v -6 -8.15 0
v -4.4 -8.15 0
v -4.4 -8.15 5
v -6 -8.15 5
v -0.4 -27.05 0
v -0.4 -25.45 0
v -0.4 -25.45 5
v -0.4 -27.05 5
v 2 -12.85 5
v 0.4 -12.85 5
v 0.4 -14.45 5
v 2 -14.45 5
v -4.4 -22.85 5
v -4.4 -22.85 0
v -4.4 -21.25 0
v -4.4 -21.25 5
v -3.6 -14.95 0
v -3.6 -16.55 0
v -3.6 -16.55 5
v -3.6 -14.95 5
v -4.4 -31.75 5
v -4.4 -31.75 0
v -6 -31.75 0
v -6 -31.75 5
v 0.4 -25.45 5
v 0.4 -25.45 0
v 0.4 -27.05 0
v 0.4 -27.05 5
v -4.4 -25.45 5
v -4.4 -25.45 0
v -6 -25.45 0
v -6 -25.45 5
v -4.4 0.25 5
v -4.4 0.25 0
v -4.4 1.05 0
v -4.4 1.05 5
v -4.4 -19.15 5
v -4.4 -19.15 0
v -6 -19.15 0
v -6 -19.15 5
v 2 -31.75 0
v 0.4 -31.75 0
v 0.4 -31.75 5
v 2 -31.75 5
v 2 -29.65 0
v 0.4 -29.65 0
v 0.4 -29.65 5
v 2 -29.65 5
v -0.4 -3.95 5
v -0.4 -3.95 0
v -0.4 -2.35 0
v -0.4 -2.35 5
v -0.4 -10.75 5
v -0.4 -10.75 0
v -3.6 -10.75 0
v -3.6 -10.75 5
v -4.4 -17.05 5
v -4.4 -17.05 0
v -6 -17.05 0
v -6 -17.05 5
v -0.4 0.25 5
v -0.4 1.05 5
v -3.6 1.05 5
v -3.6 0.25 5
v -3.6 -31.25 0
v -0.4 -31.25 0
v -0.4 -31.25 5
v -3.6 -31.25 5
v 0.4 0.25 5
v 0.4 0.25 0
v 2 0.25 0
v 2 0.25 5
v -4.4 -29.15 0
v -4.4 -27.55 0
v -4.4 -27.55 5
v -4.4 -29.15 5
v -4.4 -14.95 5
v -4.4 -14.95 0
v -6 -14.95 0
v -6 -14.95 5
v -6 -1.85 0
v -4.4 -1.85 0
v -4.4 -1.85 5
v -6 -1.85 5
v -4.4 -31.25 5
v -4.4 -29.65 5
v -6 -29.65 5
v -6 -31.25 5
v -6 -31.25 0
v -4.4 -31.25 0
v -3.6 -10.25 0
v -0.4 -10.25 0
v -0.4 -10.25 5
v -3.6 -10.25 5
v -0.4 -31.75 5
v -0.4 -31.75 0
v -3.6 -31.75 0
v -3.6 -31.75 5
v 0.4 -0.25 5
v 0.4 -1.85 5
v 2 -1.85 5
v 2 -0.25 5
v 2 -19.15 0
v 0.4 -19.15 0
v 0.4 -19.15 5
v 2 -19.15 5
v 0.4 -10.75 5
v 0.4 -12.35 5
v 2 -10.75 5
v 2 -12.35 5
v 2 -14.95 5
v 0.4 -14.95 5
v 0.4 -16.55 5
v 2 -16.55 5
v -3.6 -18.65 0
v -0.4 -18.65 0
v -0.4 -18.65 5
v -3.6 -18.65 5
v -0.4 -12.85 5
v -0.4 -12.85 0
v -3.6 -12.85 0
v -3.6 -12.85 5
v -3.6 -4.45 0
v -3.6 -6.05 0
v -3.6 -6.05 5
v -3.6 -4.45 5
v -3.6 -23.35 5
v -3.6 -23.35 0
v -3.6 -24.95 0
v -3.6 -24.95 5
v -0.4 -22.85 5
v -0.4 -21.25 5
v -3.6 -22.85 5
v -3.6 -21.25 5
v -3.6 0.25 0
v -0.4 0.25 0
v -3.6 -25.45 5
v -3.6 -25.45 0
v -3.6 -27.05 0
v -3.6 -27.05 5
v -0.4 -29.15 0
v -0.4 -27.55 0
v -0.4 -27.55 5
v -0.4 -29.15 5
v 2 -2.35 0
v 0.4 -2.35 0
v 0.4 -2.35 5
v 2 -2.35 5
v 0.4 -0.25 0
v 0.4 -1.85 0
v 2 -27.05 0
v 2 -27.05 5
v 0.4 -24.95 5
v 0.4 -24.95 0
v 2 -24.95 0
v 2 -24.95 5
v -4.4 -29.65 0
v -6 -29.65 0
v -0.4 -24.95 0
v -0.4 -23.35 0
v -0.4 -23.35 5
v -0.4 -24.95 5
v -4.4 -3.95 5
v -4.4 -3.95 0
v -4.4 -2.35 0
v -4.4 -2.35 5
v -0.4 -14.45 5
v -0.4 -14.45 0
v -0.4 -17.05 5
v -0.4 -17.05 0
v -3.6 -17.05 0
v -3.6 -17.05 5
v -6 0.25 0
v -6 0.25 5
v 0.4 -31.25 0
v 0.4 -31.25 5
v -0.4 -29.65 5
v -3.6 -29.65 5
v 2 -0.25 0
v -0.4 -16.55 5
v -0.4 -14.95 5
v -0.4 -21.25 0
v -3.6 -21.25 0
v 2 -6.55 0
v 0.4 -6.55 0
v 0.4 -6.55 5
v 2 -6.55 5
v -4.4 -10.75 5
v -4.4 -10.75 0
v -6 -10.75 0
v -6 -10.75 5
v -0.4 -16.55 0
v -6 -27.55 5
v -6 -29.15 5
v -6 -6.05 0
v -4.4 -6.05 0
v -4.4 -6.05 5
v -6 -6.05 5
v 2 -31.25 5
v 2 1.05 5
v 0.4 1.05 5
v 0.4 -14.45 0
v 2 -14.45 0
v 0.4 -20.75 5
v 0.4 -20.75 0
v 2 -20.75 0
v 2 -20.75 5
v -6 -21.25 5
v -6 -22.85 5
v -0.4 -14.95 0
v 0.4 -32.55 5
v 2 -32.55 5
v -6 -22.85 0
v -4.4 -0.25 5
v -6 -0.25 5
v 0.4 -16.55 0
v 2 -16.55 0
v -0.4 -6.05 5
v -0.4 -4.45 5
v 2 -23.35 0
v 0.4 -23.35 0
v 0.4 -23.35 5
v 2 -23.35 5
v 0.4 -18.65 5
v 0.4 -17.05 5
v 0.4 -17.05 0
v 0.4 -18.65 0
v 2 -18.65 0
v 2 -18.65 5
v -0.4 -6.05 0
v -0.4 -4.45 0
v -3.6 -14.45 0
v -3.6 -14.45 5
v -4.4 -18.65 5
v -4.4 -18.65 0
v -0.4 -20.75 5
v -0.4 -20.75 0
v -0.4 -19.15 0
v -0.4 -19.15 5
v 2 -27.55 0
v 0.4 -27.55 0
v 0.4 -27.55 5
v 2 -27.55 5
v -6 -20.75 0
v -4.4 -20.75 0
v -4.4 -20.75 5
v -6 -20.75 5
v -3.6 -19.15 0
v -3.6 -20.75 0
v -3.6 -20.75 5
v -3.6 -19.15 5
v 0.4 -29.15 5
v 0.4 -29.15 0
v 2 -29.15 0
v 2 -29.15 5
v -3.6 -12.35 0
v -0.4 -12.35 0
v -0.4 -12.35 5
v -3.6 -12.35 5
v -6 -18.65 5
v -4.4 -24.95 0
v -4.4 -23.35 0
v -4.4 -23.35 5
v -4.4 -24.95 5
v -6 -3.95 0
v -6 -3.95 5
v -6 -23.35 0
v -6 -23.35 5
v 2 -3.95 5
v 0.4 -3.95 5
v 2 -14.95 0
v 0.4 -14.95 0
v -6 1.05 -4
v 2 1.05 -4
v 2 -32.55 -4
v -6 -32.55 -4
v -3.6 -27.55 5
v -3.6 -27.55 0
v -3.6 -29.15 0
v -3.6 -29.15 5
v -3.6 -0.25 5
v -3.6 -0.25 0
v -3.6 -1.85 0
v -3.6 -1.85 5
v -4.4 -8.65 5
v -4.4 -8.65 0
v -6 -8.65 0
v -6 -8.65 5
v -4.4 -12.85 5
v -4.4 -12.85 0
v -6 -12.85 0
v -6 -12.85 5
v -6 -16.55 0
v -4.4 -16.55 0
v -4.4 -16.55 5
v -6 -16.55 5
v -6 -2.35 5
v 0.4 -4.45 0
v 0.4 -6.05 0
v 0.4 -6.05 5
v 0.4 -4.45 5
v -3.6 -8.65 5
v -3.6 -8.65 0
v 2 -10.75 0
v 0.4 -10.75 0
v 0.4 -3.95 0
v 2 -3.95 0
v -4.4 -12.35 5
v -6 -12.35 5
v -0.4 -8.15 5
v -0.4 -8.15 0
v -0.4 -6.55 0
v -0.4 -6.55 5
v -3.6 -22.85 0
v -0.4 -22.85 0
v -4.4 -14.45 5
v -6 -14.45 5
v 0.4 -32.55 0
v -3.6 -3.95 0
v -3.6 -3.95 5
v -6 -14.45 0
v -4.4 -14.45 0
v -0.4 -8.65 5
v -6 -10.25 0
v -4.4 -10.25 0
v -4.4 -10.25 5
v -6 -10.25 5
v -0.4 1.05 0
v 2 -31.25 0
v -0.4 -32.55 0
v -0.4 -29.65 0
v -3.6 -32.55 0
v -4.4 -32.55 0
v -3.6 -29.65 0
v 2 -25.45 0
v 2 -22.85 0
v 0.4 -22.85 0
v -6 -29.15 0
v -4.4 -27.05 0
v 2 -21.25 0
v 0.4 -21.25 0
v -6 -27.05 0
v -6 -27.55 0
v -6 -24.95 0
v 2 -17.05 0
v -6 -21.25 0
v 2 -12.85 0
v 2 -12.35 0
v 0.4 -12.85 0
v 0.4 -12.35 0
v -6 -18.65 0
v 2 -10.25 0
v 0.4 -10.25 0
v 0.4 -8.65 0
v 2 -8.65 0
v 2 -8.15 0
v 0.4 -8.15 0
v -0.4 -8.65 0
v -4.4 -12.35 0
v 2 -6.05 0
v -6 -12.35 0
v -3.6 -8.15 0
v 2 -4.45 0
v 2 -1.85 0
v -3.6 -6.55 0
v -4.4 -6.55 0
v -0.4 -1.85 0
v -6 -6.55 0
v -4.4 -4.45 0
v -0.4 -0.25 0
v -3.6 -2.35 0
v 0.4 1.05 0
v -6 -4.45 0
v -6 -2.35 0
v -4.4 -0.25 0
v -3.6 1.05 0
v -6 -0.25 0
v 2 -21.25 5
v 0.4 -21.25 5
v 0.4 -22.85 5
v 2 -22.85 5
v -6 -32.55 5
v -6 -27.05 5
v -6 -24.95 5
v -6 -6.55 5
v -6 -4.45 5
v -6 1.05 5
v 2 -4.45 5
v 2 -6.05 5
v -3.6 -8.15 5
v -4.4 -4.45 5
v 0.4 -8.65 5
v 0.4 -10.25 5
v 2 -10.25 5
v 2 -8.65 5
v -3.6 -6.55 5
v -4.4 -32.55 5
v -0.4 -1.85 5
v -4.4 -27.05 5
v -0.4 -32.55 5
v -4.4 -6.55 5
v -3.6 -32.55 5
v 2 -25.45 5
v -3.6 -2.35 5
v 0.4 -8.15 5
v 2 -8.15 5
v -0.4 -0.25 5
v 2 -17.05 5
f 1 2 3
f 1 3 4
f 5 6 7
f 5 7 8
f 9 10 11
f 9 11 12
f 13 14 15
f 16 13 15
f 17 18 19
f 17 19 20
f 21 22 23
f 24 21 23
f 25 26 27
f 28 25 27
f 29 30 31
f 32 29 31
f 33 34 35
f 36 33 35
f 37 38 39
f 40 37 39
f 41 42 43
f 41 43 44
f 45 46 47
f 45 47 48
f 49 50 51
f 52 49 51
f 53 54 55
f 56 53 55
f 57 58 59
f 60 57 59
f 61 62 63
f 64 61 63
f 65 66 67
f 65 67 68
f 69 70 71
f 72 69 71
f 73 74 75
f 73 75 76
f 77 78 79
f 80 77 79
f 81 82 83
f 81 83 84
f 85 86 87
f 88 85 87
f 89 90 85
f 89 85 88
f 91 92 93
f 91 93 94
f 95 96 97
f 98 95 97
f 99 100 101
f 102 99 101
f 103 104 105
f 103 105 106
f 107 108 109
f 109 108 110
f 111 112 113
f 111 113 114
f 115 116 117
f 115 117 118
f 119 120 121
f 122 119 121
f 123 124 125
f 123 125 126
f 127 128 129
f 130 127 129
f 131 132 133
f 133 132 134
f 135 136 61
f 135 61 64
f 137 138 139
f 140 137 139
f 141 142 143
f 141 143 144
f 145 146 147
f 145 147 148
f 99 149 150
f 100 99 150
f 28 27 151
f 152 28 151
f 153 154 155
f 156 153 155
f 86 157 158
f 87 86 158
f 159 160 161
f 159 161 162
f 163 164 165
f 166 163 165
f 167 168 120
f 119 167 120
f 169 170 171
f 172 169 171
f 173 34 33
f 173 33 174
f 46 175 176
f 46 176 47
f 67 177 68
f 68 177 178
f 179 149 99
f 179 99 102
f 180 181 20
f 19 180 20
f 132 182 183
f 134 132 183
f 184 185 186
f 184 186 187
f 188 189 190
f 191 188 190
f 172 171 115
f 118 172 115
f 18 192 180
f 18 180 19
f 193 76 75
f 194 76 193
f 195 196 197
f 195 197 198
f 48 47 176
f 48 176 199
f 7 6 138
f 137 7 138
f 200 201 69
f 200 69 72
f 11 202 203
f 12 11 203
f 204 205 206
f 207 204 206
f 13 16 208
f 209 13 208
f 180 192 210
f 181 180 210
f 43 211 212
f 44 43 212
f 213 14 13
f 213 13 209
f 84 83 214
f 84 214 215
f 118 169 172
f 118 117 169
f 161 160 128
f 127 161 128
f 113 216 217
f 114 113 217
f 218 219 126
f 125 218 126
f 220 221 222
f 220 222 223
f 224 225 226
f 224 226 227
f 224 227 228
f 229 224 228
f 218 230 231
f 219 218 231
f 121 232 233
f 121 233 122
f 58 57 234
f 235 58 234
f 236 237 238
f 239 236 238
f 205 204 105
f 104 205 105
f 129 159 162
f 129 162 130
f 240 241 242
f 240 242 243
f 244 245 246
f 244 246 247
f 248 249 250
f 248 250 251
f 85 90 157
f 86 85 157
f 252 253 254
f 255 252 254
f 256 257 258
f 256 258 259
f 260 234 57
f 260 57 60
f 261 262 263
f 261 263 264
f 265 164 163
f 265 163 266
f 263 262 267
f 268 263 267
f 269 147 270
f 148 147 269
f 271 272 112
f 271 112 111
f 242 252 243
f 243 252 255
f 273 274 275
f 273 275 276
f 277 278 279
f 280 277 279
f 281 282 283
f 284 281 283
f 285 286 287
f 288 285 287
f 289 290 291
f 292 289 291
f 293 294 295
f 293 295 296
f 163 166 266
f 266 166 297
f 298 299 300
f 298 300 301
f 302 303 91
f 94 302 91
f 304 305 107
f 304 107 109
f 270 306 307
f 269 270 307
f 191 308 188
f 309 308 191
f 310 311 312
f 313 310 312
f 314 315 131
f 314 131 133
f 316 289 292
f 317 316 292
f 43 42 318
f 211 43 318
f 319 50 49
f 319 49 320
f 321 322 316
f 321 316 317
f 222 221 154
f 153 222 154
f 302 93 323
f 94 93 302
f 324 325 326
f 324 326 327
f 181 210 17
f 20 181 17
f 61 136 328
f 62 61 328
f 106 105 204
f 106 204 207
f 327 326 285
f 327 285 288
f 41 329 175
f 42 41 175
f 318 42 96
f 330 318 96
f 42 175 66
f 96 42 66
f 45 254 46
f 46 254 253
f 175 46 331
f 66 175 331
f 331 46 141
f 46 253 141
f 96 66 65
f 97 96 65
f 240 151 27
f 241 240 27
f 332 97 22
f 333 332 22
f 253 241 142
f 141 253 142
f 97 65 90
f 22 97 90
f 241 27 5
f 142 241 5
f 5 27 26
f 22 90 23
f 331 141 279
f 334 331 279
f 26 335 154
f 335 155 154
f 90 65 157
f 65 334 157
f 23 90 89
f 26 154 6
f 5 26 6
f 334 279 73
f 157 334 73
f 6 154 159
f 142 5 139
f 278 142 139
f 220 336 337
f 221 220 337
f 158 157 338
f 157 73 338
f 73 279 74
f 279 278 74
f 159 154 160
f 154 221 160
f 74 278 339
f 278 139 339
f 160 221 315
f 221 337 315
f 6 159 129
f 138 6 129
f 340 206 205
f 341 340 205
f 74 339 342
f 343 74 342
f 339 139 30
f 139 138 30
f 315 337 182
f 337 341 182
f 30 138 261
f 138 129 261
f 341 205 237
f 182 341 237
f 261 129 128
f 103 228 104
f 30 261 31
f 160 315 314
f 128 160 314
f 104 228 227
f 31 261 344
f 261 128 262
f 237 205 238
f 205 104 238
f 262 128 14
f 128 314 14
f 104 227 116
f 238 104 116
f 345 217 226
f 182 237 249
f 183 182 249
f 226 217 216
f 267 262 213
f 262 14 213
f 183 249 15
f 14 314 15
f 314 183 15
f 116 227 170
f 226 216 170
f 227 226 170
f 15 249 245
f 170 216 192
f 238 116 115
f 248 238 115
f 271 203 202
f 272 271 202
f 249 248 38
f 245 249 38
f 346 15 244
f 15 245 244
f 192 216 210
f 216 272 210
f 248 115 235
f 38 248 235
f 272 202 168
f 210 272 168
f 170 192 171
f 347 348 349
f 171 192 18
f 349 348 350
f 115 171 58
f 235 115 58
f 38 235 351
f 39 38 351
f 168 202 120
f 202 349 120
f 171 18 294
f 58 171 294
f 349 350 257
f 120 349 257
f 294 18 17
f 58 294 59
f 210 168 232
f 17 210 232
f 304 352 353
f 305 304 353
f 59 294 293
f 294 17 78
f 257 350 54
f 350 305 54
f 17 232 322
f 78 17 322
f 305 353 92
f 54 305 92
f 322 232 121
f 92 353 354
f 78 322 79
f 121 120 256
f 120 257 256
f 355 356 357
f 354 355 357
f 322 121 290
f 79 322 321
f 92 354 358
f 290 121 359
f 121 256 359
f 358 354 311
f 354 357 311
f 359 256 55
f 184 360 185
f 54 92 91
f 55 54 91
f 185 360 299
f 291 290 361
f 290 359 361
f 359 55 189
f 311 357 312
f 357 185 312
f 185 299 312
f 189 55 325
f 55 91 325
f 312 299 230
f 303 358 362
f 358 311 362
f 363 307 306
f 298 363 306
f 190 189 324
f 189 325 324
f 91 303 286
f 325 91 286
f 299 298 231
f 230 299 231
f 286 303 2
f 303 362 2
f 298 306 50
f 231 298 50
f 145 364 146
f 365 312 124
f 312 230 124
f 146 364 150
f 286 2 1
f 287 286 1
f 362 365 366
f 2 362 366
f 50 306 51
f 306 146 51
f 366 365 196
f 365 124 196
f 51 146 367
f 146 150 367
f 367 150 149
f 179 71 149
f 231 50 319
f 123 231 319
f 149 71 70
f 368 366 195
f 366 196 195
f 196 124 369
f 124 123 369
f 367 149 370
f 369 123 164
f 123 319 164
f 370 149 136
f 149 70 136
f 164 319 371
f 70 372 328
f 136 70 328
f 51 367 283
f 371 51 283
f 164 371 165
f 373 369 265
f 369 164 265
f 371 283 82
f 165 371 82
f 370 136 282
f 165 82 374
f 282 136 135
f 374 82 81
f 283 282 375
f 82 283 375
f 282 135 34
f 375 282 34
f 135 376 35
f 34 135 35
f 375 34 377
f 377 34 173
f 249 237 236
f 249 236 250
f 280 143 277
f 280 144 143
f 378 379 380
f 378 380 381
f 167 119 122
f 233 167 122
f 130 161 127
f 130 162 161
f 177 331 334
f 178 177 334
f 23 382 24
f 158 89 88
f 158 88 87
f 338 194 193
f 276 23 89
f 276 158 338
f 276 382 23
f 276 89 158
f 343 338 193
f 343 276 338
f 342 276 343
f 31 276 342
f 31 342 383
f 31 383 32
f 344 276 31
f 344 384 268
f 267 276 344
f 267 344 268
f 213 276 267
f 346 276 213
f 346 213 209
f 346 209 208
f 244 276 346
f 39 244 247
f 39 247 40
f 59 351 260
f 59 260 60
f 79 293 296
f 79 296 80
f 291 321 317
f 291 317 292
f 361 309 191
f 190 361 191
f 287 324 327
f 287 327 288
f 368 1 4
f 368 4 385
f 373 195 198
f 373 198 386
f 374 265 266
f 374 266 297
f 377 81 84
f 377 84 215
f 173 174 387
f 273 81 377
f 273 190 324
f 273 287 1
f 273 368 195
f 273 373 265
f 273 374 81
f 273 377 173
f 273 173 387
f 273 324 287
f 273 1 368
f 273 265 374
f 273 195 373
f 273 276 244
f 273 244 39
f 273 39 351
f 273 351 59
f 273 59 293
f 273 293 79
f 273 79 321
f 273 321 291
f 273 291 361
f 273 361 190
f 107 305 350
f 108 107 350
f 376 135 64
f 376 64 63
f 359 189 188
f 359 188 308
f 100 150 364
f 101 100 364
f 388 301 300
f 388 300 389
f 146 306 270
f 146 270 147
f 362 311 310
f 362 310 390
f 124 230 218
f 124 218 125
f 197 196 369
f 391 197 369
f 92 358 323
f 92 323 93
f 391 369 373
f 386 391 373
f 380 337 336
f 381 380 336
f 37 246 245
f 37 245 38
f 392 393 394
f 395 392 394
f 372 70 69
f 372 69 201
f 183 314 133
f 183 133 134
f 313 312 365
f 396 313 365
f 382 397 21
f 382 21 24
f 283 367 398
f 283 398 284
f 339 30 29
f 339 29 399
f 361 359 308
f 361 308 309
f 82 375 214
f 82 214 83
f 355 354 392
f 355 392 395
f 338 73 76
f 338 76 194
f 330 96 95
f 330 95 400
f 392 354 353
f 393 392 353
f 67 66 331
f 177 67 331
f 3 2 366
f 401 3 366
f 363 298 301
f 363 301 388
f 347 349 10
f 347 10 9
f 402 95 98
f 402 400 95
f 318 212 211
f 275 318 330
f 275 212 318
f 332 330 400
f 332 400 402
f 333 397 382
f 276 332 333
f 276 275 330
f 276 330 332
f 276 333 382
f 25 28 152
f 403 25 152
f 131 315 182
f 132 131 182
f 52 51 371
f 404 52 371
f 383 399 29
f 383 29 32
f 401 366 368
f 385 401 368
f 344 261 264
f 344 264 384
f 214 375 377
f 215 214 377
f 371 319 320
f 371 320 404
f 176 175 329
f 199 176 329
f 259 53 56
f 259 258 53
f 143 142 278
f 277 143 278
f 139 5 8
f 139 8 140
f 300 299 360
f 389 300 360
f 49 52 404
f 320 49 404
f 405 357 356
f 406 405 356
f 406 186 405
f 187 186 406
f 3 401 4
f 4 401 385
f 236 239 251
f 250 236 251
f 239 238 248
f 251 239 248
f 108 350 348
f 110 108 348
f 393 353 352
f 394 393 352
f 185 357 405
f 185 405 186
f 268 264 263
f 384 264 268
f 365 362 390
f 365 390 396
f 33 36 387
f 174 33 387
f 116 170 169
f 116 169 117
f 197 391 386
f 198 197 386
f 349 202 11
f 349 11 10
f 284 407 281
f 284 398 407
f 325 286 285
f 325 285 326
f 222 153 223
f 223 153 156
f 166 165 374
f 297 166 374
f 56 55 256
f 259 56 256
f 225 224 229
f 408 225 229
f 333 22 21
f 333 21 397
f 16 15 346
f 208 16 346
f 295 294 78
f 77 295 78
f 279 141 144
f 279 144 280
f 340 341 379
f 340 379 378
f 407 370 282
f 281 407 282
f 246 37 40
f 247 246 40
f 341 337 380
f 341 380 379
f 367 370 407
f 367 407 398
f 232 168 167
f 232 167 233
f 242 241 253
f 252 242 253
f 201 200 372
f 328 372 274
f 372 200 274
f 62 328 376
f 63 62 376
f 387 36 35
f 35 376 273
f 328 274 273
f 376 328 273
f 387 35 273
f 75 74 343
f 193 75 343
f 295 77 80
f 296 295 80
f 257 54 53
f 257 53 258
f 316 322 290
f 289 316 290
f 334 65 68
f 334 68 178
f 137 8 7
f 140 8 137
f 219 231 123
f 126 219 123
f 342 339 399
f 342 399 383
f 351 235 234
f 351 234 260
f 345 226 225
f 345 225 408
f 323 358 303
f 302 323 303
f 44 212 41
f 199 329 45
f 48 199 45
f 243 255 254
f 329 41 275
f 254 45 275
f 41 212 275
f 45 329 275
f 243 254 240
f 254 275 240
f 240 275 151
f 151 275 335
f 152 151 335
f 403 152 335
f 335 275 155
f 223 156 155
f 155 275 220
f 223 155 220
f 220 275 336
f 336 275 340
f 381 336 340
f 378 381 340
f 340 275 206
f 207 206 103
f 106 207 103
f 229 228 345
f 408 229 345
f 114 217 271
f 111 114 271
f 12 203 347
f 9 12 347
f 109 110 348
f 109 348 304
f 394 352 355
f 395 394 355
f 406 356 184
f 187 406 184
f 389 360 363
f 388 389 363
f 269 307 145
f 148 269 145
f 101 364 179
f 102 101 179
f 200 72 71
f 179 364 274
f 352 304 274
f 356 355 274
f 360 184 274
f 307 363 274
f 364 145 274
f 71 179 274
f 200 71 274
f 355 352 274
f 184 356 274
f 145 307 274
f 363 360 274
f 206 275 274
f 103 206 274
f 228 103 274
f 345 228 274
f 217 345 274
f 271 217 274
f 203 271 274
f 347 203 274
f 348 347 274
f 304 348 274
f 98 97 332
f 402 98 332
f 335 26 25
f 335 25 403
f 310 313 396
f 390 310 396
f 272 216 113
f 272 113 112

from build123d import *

# Parameters (mm, degrees)
F0_W     = 1.6
F0_H     = 0.8
F0_W_2   = 0.8
F0_H_2   = 0.5
F1_DEPTH = 4
F2_DEPTH = 5


with BuildPart() as f1:
    # F0 (on Top) → F1 (new body)
    with BuildSketch(Plane.XY):
        with Locations((1.2, -0.65)):
            Rectangle(F0_W, F0_H)
        with Locations((0, 0.65)):
            Rectangle(F0_W_2, F0_H)
        with Locations((1.2, 0)):
            Rectangle(F0_W, F0_H_2)
        with Locations((0, -0.65)):
            Rectangle(F0_W_2, F0_H)
        with Locations((-1.2, -0.65)):
            Rectangle(F0_W, F0_H)
        with Locations((-1.2, 0.65)):
            Rectangle(F0_W, F0_H)
        with Locations((1.2, 0.65)):
            Rectangle(F0_W, F0_H)
        with Locations((-1.2, 0)):
            Rectangle(F0_W, F0_H_2)
        Rectangle(F0_W_2, F0_H_2)
    extrude(amount=-F1_DEPTH)

    # F0 (on Top) → F2 (join)
    with BuildSketch(Plane.XY):
        with Locations((1.2, 0.65)):
            Rectangle(F0_W, F0_H)
        with Locations((-1.2, 0.65)):
            Rectangle(F0_W, F0_H)
        with Locations((1.2, -0.65)):
            Rectangle(F0_W, F0_H)
        with Locations((-1.2, -0.65)):
            Rectangle(F0_W, F0_H)
    extrude(amount=F2_DEPTH)

    # F3: F1 across face


with BuildPart() as f1_1:
    add(f1.part)
    add(f1.part.mirror(Plane(origin=(0, -1.05, 0.25), x_dir=(1, 0, 0), z_dir=(0, -1, 0))))

    # F4: F1 across face


with BuildPart() as f1_2:
    add(f1_1.part)
    add(f1_1.part.mirror(Plane(origin=(0, -3.15, 0.25), x_dir=(1, 0, 0), z_dir=(0, -1, 0))))

    # F5: F1 across face


with BuildPart() as f1_3:
    add(f1_2.part)
    add(f1_2.part.mirror(Plane(origin=(0, -7.35, 0.25), x_dir=(1, 0, 0), z_dir=(0, -1, 0))))

    # F6: F1 across face


with BuildPart() as f1_4:
    add(f1_3.part)
    add(f1_3.part.mirror(Plane(origin=(0, -15.75, 0.25), x_dir=(1, 0, 0), z_dir=(0, -1, 0))))

    # F7: F1 across face


with BuildPart() as f1_5:
    add(f1_4.part)
    add(f1_4.part.mirror(Plane(origin=(-2, -15.75, 0.1951219512), x_dir=(0, -1, 0), z_dir=(-1, 0, 0))))


solid = f1_5.part
